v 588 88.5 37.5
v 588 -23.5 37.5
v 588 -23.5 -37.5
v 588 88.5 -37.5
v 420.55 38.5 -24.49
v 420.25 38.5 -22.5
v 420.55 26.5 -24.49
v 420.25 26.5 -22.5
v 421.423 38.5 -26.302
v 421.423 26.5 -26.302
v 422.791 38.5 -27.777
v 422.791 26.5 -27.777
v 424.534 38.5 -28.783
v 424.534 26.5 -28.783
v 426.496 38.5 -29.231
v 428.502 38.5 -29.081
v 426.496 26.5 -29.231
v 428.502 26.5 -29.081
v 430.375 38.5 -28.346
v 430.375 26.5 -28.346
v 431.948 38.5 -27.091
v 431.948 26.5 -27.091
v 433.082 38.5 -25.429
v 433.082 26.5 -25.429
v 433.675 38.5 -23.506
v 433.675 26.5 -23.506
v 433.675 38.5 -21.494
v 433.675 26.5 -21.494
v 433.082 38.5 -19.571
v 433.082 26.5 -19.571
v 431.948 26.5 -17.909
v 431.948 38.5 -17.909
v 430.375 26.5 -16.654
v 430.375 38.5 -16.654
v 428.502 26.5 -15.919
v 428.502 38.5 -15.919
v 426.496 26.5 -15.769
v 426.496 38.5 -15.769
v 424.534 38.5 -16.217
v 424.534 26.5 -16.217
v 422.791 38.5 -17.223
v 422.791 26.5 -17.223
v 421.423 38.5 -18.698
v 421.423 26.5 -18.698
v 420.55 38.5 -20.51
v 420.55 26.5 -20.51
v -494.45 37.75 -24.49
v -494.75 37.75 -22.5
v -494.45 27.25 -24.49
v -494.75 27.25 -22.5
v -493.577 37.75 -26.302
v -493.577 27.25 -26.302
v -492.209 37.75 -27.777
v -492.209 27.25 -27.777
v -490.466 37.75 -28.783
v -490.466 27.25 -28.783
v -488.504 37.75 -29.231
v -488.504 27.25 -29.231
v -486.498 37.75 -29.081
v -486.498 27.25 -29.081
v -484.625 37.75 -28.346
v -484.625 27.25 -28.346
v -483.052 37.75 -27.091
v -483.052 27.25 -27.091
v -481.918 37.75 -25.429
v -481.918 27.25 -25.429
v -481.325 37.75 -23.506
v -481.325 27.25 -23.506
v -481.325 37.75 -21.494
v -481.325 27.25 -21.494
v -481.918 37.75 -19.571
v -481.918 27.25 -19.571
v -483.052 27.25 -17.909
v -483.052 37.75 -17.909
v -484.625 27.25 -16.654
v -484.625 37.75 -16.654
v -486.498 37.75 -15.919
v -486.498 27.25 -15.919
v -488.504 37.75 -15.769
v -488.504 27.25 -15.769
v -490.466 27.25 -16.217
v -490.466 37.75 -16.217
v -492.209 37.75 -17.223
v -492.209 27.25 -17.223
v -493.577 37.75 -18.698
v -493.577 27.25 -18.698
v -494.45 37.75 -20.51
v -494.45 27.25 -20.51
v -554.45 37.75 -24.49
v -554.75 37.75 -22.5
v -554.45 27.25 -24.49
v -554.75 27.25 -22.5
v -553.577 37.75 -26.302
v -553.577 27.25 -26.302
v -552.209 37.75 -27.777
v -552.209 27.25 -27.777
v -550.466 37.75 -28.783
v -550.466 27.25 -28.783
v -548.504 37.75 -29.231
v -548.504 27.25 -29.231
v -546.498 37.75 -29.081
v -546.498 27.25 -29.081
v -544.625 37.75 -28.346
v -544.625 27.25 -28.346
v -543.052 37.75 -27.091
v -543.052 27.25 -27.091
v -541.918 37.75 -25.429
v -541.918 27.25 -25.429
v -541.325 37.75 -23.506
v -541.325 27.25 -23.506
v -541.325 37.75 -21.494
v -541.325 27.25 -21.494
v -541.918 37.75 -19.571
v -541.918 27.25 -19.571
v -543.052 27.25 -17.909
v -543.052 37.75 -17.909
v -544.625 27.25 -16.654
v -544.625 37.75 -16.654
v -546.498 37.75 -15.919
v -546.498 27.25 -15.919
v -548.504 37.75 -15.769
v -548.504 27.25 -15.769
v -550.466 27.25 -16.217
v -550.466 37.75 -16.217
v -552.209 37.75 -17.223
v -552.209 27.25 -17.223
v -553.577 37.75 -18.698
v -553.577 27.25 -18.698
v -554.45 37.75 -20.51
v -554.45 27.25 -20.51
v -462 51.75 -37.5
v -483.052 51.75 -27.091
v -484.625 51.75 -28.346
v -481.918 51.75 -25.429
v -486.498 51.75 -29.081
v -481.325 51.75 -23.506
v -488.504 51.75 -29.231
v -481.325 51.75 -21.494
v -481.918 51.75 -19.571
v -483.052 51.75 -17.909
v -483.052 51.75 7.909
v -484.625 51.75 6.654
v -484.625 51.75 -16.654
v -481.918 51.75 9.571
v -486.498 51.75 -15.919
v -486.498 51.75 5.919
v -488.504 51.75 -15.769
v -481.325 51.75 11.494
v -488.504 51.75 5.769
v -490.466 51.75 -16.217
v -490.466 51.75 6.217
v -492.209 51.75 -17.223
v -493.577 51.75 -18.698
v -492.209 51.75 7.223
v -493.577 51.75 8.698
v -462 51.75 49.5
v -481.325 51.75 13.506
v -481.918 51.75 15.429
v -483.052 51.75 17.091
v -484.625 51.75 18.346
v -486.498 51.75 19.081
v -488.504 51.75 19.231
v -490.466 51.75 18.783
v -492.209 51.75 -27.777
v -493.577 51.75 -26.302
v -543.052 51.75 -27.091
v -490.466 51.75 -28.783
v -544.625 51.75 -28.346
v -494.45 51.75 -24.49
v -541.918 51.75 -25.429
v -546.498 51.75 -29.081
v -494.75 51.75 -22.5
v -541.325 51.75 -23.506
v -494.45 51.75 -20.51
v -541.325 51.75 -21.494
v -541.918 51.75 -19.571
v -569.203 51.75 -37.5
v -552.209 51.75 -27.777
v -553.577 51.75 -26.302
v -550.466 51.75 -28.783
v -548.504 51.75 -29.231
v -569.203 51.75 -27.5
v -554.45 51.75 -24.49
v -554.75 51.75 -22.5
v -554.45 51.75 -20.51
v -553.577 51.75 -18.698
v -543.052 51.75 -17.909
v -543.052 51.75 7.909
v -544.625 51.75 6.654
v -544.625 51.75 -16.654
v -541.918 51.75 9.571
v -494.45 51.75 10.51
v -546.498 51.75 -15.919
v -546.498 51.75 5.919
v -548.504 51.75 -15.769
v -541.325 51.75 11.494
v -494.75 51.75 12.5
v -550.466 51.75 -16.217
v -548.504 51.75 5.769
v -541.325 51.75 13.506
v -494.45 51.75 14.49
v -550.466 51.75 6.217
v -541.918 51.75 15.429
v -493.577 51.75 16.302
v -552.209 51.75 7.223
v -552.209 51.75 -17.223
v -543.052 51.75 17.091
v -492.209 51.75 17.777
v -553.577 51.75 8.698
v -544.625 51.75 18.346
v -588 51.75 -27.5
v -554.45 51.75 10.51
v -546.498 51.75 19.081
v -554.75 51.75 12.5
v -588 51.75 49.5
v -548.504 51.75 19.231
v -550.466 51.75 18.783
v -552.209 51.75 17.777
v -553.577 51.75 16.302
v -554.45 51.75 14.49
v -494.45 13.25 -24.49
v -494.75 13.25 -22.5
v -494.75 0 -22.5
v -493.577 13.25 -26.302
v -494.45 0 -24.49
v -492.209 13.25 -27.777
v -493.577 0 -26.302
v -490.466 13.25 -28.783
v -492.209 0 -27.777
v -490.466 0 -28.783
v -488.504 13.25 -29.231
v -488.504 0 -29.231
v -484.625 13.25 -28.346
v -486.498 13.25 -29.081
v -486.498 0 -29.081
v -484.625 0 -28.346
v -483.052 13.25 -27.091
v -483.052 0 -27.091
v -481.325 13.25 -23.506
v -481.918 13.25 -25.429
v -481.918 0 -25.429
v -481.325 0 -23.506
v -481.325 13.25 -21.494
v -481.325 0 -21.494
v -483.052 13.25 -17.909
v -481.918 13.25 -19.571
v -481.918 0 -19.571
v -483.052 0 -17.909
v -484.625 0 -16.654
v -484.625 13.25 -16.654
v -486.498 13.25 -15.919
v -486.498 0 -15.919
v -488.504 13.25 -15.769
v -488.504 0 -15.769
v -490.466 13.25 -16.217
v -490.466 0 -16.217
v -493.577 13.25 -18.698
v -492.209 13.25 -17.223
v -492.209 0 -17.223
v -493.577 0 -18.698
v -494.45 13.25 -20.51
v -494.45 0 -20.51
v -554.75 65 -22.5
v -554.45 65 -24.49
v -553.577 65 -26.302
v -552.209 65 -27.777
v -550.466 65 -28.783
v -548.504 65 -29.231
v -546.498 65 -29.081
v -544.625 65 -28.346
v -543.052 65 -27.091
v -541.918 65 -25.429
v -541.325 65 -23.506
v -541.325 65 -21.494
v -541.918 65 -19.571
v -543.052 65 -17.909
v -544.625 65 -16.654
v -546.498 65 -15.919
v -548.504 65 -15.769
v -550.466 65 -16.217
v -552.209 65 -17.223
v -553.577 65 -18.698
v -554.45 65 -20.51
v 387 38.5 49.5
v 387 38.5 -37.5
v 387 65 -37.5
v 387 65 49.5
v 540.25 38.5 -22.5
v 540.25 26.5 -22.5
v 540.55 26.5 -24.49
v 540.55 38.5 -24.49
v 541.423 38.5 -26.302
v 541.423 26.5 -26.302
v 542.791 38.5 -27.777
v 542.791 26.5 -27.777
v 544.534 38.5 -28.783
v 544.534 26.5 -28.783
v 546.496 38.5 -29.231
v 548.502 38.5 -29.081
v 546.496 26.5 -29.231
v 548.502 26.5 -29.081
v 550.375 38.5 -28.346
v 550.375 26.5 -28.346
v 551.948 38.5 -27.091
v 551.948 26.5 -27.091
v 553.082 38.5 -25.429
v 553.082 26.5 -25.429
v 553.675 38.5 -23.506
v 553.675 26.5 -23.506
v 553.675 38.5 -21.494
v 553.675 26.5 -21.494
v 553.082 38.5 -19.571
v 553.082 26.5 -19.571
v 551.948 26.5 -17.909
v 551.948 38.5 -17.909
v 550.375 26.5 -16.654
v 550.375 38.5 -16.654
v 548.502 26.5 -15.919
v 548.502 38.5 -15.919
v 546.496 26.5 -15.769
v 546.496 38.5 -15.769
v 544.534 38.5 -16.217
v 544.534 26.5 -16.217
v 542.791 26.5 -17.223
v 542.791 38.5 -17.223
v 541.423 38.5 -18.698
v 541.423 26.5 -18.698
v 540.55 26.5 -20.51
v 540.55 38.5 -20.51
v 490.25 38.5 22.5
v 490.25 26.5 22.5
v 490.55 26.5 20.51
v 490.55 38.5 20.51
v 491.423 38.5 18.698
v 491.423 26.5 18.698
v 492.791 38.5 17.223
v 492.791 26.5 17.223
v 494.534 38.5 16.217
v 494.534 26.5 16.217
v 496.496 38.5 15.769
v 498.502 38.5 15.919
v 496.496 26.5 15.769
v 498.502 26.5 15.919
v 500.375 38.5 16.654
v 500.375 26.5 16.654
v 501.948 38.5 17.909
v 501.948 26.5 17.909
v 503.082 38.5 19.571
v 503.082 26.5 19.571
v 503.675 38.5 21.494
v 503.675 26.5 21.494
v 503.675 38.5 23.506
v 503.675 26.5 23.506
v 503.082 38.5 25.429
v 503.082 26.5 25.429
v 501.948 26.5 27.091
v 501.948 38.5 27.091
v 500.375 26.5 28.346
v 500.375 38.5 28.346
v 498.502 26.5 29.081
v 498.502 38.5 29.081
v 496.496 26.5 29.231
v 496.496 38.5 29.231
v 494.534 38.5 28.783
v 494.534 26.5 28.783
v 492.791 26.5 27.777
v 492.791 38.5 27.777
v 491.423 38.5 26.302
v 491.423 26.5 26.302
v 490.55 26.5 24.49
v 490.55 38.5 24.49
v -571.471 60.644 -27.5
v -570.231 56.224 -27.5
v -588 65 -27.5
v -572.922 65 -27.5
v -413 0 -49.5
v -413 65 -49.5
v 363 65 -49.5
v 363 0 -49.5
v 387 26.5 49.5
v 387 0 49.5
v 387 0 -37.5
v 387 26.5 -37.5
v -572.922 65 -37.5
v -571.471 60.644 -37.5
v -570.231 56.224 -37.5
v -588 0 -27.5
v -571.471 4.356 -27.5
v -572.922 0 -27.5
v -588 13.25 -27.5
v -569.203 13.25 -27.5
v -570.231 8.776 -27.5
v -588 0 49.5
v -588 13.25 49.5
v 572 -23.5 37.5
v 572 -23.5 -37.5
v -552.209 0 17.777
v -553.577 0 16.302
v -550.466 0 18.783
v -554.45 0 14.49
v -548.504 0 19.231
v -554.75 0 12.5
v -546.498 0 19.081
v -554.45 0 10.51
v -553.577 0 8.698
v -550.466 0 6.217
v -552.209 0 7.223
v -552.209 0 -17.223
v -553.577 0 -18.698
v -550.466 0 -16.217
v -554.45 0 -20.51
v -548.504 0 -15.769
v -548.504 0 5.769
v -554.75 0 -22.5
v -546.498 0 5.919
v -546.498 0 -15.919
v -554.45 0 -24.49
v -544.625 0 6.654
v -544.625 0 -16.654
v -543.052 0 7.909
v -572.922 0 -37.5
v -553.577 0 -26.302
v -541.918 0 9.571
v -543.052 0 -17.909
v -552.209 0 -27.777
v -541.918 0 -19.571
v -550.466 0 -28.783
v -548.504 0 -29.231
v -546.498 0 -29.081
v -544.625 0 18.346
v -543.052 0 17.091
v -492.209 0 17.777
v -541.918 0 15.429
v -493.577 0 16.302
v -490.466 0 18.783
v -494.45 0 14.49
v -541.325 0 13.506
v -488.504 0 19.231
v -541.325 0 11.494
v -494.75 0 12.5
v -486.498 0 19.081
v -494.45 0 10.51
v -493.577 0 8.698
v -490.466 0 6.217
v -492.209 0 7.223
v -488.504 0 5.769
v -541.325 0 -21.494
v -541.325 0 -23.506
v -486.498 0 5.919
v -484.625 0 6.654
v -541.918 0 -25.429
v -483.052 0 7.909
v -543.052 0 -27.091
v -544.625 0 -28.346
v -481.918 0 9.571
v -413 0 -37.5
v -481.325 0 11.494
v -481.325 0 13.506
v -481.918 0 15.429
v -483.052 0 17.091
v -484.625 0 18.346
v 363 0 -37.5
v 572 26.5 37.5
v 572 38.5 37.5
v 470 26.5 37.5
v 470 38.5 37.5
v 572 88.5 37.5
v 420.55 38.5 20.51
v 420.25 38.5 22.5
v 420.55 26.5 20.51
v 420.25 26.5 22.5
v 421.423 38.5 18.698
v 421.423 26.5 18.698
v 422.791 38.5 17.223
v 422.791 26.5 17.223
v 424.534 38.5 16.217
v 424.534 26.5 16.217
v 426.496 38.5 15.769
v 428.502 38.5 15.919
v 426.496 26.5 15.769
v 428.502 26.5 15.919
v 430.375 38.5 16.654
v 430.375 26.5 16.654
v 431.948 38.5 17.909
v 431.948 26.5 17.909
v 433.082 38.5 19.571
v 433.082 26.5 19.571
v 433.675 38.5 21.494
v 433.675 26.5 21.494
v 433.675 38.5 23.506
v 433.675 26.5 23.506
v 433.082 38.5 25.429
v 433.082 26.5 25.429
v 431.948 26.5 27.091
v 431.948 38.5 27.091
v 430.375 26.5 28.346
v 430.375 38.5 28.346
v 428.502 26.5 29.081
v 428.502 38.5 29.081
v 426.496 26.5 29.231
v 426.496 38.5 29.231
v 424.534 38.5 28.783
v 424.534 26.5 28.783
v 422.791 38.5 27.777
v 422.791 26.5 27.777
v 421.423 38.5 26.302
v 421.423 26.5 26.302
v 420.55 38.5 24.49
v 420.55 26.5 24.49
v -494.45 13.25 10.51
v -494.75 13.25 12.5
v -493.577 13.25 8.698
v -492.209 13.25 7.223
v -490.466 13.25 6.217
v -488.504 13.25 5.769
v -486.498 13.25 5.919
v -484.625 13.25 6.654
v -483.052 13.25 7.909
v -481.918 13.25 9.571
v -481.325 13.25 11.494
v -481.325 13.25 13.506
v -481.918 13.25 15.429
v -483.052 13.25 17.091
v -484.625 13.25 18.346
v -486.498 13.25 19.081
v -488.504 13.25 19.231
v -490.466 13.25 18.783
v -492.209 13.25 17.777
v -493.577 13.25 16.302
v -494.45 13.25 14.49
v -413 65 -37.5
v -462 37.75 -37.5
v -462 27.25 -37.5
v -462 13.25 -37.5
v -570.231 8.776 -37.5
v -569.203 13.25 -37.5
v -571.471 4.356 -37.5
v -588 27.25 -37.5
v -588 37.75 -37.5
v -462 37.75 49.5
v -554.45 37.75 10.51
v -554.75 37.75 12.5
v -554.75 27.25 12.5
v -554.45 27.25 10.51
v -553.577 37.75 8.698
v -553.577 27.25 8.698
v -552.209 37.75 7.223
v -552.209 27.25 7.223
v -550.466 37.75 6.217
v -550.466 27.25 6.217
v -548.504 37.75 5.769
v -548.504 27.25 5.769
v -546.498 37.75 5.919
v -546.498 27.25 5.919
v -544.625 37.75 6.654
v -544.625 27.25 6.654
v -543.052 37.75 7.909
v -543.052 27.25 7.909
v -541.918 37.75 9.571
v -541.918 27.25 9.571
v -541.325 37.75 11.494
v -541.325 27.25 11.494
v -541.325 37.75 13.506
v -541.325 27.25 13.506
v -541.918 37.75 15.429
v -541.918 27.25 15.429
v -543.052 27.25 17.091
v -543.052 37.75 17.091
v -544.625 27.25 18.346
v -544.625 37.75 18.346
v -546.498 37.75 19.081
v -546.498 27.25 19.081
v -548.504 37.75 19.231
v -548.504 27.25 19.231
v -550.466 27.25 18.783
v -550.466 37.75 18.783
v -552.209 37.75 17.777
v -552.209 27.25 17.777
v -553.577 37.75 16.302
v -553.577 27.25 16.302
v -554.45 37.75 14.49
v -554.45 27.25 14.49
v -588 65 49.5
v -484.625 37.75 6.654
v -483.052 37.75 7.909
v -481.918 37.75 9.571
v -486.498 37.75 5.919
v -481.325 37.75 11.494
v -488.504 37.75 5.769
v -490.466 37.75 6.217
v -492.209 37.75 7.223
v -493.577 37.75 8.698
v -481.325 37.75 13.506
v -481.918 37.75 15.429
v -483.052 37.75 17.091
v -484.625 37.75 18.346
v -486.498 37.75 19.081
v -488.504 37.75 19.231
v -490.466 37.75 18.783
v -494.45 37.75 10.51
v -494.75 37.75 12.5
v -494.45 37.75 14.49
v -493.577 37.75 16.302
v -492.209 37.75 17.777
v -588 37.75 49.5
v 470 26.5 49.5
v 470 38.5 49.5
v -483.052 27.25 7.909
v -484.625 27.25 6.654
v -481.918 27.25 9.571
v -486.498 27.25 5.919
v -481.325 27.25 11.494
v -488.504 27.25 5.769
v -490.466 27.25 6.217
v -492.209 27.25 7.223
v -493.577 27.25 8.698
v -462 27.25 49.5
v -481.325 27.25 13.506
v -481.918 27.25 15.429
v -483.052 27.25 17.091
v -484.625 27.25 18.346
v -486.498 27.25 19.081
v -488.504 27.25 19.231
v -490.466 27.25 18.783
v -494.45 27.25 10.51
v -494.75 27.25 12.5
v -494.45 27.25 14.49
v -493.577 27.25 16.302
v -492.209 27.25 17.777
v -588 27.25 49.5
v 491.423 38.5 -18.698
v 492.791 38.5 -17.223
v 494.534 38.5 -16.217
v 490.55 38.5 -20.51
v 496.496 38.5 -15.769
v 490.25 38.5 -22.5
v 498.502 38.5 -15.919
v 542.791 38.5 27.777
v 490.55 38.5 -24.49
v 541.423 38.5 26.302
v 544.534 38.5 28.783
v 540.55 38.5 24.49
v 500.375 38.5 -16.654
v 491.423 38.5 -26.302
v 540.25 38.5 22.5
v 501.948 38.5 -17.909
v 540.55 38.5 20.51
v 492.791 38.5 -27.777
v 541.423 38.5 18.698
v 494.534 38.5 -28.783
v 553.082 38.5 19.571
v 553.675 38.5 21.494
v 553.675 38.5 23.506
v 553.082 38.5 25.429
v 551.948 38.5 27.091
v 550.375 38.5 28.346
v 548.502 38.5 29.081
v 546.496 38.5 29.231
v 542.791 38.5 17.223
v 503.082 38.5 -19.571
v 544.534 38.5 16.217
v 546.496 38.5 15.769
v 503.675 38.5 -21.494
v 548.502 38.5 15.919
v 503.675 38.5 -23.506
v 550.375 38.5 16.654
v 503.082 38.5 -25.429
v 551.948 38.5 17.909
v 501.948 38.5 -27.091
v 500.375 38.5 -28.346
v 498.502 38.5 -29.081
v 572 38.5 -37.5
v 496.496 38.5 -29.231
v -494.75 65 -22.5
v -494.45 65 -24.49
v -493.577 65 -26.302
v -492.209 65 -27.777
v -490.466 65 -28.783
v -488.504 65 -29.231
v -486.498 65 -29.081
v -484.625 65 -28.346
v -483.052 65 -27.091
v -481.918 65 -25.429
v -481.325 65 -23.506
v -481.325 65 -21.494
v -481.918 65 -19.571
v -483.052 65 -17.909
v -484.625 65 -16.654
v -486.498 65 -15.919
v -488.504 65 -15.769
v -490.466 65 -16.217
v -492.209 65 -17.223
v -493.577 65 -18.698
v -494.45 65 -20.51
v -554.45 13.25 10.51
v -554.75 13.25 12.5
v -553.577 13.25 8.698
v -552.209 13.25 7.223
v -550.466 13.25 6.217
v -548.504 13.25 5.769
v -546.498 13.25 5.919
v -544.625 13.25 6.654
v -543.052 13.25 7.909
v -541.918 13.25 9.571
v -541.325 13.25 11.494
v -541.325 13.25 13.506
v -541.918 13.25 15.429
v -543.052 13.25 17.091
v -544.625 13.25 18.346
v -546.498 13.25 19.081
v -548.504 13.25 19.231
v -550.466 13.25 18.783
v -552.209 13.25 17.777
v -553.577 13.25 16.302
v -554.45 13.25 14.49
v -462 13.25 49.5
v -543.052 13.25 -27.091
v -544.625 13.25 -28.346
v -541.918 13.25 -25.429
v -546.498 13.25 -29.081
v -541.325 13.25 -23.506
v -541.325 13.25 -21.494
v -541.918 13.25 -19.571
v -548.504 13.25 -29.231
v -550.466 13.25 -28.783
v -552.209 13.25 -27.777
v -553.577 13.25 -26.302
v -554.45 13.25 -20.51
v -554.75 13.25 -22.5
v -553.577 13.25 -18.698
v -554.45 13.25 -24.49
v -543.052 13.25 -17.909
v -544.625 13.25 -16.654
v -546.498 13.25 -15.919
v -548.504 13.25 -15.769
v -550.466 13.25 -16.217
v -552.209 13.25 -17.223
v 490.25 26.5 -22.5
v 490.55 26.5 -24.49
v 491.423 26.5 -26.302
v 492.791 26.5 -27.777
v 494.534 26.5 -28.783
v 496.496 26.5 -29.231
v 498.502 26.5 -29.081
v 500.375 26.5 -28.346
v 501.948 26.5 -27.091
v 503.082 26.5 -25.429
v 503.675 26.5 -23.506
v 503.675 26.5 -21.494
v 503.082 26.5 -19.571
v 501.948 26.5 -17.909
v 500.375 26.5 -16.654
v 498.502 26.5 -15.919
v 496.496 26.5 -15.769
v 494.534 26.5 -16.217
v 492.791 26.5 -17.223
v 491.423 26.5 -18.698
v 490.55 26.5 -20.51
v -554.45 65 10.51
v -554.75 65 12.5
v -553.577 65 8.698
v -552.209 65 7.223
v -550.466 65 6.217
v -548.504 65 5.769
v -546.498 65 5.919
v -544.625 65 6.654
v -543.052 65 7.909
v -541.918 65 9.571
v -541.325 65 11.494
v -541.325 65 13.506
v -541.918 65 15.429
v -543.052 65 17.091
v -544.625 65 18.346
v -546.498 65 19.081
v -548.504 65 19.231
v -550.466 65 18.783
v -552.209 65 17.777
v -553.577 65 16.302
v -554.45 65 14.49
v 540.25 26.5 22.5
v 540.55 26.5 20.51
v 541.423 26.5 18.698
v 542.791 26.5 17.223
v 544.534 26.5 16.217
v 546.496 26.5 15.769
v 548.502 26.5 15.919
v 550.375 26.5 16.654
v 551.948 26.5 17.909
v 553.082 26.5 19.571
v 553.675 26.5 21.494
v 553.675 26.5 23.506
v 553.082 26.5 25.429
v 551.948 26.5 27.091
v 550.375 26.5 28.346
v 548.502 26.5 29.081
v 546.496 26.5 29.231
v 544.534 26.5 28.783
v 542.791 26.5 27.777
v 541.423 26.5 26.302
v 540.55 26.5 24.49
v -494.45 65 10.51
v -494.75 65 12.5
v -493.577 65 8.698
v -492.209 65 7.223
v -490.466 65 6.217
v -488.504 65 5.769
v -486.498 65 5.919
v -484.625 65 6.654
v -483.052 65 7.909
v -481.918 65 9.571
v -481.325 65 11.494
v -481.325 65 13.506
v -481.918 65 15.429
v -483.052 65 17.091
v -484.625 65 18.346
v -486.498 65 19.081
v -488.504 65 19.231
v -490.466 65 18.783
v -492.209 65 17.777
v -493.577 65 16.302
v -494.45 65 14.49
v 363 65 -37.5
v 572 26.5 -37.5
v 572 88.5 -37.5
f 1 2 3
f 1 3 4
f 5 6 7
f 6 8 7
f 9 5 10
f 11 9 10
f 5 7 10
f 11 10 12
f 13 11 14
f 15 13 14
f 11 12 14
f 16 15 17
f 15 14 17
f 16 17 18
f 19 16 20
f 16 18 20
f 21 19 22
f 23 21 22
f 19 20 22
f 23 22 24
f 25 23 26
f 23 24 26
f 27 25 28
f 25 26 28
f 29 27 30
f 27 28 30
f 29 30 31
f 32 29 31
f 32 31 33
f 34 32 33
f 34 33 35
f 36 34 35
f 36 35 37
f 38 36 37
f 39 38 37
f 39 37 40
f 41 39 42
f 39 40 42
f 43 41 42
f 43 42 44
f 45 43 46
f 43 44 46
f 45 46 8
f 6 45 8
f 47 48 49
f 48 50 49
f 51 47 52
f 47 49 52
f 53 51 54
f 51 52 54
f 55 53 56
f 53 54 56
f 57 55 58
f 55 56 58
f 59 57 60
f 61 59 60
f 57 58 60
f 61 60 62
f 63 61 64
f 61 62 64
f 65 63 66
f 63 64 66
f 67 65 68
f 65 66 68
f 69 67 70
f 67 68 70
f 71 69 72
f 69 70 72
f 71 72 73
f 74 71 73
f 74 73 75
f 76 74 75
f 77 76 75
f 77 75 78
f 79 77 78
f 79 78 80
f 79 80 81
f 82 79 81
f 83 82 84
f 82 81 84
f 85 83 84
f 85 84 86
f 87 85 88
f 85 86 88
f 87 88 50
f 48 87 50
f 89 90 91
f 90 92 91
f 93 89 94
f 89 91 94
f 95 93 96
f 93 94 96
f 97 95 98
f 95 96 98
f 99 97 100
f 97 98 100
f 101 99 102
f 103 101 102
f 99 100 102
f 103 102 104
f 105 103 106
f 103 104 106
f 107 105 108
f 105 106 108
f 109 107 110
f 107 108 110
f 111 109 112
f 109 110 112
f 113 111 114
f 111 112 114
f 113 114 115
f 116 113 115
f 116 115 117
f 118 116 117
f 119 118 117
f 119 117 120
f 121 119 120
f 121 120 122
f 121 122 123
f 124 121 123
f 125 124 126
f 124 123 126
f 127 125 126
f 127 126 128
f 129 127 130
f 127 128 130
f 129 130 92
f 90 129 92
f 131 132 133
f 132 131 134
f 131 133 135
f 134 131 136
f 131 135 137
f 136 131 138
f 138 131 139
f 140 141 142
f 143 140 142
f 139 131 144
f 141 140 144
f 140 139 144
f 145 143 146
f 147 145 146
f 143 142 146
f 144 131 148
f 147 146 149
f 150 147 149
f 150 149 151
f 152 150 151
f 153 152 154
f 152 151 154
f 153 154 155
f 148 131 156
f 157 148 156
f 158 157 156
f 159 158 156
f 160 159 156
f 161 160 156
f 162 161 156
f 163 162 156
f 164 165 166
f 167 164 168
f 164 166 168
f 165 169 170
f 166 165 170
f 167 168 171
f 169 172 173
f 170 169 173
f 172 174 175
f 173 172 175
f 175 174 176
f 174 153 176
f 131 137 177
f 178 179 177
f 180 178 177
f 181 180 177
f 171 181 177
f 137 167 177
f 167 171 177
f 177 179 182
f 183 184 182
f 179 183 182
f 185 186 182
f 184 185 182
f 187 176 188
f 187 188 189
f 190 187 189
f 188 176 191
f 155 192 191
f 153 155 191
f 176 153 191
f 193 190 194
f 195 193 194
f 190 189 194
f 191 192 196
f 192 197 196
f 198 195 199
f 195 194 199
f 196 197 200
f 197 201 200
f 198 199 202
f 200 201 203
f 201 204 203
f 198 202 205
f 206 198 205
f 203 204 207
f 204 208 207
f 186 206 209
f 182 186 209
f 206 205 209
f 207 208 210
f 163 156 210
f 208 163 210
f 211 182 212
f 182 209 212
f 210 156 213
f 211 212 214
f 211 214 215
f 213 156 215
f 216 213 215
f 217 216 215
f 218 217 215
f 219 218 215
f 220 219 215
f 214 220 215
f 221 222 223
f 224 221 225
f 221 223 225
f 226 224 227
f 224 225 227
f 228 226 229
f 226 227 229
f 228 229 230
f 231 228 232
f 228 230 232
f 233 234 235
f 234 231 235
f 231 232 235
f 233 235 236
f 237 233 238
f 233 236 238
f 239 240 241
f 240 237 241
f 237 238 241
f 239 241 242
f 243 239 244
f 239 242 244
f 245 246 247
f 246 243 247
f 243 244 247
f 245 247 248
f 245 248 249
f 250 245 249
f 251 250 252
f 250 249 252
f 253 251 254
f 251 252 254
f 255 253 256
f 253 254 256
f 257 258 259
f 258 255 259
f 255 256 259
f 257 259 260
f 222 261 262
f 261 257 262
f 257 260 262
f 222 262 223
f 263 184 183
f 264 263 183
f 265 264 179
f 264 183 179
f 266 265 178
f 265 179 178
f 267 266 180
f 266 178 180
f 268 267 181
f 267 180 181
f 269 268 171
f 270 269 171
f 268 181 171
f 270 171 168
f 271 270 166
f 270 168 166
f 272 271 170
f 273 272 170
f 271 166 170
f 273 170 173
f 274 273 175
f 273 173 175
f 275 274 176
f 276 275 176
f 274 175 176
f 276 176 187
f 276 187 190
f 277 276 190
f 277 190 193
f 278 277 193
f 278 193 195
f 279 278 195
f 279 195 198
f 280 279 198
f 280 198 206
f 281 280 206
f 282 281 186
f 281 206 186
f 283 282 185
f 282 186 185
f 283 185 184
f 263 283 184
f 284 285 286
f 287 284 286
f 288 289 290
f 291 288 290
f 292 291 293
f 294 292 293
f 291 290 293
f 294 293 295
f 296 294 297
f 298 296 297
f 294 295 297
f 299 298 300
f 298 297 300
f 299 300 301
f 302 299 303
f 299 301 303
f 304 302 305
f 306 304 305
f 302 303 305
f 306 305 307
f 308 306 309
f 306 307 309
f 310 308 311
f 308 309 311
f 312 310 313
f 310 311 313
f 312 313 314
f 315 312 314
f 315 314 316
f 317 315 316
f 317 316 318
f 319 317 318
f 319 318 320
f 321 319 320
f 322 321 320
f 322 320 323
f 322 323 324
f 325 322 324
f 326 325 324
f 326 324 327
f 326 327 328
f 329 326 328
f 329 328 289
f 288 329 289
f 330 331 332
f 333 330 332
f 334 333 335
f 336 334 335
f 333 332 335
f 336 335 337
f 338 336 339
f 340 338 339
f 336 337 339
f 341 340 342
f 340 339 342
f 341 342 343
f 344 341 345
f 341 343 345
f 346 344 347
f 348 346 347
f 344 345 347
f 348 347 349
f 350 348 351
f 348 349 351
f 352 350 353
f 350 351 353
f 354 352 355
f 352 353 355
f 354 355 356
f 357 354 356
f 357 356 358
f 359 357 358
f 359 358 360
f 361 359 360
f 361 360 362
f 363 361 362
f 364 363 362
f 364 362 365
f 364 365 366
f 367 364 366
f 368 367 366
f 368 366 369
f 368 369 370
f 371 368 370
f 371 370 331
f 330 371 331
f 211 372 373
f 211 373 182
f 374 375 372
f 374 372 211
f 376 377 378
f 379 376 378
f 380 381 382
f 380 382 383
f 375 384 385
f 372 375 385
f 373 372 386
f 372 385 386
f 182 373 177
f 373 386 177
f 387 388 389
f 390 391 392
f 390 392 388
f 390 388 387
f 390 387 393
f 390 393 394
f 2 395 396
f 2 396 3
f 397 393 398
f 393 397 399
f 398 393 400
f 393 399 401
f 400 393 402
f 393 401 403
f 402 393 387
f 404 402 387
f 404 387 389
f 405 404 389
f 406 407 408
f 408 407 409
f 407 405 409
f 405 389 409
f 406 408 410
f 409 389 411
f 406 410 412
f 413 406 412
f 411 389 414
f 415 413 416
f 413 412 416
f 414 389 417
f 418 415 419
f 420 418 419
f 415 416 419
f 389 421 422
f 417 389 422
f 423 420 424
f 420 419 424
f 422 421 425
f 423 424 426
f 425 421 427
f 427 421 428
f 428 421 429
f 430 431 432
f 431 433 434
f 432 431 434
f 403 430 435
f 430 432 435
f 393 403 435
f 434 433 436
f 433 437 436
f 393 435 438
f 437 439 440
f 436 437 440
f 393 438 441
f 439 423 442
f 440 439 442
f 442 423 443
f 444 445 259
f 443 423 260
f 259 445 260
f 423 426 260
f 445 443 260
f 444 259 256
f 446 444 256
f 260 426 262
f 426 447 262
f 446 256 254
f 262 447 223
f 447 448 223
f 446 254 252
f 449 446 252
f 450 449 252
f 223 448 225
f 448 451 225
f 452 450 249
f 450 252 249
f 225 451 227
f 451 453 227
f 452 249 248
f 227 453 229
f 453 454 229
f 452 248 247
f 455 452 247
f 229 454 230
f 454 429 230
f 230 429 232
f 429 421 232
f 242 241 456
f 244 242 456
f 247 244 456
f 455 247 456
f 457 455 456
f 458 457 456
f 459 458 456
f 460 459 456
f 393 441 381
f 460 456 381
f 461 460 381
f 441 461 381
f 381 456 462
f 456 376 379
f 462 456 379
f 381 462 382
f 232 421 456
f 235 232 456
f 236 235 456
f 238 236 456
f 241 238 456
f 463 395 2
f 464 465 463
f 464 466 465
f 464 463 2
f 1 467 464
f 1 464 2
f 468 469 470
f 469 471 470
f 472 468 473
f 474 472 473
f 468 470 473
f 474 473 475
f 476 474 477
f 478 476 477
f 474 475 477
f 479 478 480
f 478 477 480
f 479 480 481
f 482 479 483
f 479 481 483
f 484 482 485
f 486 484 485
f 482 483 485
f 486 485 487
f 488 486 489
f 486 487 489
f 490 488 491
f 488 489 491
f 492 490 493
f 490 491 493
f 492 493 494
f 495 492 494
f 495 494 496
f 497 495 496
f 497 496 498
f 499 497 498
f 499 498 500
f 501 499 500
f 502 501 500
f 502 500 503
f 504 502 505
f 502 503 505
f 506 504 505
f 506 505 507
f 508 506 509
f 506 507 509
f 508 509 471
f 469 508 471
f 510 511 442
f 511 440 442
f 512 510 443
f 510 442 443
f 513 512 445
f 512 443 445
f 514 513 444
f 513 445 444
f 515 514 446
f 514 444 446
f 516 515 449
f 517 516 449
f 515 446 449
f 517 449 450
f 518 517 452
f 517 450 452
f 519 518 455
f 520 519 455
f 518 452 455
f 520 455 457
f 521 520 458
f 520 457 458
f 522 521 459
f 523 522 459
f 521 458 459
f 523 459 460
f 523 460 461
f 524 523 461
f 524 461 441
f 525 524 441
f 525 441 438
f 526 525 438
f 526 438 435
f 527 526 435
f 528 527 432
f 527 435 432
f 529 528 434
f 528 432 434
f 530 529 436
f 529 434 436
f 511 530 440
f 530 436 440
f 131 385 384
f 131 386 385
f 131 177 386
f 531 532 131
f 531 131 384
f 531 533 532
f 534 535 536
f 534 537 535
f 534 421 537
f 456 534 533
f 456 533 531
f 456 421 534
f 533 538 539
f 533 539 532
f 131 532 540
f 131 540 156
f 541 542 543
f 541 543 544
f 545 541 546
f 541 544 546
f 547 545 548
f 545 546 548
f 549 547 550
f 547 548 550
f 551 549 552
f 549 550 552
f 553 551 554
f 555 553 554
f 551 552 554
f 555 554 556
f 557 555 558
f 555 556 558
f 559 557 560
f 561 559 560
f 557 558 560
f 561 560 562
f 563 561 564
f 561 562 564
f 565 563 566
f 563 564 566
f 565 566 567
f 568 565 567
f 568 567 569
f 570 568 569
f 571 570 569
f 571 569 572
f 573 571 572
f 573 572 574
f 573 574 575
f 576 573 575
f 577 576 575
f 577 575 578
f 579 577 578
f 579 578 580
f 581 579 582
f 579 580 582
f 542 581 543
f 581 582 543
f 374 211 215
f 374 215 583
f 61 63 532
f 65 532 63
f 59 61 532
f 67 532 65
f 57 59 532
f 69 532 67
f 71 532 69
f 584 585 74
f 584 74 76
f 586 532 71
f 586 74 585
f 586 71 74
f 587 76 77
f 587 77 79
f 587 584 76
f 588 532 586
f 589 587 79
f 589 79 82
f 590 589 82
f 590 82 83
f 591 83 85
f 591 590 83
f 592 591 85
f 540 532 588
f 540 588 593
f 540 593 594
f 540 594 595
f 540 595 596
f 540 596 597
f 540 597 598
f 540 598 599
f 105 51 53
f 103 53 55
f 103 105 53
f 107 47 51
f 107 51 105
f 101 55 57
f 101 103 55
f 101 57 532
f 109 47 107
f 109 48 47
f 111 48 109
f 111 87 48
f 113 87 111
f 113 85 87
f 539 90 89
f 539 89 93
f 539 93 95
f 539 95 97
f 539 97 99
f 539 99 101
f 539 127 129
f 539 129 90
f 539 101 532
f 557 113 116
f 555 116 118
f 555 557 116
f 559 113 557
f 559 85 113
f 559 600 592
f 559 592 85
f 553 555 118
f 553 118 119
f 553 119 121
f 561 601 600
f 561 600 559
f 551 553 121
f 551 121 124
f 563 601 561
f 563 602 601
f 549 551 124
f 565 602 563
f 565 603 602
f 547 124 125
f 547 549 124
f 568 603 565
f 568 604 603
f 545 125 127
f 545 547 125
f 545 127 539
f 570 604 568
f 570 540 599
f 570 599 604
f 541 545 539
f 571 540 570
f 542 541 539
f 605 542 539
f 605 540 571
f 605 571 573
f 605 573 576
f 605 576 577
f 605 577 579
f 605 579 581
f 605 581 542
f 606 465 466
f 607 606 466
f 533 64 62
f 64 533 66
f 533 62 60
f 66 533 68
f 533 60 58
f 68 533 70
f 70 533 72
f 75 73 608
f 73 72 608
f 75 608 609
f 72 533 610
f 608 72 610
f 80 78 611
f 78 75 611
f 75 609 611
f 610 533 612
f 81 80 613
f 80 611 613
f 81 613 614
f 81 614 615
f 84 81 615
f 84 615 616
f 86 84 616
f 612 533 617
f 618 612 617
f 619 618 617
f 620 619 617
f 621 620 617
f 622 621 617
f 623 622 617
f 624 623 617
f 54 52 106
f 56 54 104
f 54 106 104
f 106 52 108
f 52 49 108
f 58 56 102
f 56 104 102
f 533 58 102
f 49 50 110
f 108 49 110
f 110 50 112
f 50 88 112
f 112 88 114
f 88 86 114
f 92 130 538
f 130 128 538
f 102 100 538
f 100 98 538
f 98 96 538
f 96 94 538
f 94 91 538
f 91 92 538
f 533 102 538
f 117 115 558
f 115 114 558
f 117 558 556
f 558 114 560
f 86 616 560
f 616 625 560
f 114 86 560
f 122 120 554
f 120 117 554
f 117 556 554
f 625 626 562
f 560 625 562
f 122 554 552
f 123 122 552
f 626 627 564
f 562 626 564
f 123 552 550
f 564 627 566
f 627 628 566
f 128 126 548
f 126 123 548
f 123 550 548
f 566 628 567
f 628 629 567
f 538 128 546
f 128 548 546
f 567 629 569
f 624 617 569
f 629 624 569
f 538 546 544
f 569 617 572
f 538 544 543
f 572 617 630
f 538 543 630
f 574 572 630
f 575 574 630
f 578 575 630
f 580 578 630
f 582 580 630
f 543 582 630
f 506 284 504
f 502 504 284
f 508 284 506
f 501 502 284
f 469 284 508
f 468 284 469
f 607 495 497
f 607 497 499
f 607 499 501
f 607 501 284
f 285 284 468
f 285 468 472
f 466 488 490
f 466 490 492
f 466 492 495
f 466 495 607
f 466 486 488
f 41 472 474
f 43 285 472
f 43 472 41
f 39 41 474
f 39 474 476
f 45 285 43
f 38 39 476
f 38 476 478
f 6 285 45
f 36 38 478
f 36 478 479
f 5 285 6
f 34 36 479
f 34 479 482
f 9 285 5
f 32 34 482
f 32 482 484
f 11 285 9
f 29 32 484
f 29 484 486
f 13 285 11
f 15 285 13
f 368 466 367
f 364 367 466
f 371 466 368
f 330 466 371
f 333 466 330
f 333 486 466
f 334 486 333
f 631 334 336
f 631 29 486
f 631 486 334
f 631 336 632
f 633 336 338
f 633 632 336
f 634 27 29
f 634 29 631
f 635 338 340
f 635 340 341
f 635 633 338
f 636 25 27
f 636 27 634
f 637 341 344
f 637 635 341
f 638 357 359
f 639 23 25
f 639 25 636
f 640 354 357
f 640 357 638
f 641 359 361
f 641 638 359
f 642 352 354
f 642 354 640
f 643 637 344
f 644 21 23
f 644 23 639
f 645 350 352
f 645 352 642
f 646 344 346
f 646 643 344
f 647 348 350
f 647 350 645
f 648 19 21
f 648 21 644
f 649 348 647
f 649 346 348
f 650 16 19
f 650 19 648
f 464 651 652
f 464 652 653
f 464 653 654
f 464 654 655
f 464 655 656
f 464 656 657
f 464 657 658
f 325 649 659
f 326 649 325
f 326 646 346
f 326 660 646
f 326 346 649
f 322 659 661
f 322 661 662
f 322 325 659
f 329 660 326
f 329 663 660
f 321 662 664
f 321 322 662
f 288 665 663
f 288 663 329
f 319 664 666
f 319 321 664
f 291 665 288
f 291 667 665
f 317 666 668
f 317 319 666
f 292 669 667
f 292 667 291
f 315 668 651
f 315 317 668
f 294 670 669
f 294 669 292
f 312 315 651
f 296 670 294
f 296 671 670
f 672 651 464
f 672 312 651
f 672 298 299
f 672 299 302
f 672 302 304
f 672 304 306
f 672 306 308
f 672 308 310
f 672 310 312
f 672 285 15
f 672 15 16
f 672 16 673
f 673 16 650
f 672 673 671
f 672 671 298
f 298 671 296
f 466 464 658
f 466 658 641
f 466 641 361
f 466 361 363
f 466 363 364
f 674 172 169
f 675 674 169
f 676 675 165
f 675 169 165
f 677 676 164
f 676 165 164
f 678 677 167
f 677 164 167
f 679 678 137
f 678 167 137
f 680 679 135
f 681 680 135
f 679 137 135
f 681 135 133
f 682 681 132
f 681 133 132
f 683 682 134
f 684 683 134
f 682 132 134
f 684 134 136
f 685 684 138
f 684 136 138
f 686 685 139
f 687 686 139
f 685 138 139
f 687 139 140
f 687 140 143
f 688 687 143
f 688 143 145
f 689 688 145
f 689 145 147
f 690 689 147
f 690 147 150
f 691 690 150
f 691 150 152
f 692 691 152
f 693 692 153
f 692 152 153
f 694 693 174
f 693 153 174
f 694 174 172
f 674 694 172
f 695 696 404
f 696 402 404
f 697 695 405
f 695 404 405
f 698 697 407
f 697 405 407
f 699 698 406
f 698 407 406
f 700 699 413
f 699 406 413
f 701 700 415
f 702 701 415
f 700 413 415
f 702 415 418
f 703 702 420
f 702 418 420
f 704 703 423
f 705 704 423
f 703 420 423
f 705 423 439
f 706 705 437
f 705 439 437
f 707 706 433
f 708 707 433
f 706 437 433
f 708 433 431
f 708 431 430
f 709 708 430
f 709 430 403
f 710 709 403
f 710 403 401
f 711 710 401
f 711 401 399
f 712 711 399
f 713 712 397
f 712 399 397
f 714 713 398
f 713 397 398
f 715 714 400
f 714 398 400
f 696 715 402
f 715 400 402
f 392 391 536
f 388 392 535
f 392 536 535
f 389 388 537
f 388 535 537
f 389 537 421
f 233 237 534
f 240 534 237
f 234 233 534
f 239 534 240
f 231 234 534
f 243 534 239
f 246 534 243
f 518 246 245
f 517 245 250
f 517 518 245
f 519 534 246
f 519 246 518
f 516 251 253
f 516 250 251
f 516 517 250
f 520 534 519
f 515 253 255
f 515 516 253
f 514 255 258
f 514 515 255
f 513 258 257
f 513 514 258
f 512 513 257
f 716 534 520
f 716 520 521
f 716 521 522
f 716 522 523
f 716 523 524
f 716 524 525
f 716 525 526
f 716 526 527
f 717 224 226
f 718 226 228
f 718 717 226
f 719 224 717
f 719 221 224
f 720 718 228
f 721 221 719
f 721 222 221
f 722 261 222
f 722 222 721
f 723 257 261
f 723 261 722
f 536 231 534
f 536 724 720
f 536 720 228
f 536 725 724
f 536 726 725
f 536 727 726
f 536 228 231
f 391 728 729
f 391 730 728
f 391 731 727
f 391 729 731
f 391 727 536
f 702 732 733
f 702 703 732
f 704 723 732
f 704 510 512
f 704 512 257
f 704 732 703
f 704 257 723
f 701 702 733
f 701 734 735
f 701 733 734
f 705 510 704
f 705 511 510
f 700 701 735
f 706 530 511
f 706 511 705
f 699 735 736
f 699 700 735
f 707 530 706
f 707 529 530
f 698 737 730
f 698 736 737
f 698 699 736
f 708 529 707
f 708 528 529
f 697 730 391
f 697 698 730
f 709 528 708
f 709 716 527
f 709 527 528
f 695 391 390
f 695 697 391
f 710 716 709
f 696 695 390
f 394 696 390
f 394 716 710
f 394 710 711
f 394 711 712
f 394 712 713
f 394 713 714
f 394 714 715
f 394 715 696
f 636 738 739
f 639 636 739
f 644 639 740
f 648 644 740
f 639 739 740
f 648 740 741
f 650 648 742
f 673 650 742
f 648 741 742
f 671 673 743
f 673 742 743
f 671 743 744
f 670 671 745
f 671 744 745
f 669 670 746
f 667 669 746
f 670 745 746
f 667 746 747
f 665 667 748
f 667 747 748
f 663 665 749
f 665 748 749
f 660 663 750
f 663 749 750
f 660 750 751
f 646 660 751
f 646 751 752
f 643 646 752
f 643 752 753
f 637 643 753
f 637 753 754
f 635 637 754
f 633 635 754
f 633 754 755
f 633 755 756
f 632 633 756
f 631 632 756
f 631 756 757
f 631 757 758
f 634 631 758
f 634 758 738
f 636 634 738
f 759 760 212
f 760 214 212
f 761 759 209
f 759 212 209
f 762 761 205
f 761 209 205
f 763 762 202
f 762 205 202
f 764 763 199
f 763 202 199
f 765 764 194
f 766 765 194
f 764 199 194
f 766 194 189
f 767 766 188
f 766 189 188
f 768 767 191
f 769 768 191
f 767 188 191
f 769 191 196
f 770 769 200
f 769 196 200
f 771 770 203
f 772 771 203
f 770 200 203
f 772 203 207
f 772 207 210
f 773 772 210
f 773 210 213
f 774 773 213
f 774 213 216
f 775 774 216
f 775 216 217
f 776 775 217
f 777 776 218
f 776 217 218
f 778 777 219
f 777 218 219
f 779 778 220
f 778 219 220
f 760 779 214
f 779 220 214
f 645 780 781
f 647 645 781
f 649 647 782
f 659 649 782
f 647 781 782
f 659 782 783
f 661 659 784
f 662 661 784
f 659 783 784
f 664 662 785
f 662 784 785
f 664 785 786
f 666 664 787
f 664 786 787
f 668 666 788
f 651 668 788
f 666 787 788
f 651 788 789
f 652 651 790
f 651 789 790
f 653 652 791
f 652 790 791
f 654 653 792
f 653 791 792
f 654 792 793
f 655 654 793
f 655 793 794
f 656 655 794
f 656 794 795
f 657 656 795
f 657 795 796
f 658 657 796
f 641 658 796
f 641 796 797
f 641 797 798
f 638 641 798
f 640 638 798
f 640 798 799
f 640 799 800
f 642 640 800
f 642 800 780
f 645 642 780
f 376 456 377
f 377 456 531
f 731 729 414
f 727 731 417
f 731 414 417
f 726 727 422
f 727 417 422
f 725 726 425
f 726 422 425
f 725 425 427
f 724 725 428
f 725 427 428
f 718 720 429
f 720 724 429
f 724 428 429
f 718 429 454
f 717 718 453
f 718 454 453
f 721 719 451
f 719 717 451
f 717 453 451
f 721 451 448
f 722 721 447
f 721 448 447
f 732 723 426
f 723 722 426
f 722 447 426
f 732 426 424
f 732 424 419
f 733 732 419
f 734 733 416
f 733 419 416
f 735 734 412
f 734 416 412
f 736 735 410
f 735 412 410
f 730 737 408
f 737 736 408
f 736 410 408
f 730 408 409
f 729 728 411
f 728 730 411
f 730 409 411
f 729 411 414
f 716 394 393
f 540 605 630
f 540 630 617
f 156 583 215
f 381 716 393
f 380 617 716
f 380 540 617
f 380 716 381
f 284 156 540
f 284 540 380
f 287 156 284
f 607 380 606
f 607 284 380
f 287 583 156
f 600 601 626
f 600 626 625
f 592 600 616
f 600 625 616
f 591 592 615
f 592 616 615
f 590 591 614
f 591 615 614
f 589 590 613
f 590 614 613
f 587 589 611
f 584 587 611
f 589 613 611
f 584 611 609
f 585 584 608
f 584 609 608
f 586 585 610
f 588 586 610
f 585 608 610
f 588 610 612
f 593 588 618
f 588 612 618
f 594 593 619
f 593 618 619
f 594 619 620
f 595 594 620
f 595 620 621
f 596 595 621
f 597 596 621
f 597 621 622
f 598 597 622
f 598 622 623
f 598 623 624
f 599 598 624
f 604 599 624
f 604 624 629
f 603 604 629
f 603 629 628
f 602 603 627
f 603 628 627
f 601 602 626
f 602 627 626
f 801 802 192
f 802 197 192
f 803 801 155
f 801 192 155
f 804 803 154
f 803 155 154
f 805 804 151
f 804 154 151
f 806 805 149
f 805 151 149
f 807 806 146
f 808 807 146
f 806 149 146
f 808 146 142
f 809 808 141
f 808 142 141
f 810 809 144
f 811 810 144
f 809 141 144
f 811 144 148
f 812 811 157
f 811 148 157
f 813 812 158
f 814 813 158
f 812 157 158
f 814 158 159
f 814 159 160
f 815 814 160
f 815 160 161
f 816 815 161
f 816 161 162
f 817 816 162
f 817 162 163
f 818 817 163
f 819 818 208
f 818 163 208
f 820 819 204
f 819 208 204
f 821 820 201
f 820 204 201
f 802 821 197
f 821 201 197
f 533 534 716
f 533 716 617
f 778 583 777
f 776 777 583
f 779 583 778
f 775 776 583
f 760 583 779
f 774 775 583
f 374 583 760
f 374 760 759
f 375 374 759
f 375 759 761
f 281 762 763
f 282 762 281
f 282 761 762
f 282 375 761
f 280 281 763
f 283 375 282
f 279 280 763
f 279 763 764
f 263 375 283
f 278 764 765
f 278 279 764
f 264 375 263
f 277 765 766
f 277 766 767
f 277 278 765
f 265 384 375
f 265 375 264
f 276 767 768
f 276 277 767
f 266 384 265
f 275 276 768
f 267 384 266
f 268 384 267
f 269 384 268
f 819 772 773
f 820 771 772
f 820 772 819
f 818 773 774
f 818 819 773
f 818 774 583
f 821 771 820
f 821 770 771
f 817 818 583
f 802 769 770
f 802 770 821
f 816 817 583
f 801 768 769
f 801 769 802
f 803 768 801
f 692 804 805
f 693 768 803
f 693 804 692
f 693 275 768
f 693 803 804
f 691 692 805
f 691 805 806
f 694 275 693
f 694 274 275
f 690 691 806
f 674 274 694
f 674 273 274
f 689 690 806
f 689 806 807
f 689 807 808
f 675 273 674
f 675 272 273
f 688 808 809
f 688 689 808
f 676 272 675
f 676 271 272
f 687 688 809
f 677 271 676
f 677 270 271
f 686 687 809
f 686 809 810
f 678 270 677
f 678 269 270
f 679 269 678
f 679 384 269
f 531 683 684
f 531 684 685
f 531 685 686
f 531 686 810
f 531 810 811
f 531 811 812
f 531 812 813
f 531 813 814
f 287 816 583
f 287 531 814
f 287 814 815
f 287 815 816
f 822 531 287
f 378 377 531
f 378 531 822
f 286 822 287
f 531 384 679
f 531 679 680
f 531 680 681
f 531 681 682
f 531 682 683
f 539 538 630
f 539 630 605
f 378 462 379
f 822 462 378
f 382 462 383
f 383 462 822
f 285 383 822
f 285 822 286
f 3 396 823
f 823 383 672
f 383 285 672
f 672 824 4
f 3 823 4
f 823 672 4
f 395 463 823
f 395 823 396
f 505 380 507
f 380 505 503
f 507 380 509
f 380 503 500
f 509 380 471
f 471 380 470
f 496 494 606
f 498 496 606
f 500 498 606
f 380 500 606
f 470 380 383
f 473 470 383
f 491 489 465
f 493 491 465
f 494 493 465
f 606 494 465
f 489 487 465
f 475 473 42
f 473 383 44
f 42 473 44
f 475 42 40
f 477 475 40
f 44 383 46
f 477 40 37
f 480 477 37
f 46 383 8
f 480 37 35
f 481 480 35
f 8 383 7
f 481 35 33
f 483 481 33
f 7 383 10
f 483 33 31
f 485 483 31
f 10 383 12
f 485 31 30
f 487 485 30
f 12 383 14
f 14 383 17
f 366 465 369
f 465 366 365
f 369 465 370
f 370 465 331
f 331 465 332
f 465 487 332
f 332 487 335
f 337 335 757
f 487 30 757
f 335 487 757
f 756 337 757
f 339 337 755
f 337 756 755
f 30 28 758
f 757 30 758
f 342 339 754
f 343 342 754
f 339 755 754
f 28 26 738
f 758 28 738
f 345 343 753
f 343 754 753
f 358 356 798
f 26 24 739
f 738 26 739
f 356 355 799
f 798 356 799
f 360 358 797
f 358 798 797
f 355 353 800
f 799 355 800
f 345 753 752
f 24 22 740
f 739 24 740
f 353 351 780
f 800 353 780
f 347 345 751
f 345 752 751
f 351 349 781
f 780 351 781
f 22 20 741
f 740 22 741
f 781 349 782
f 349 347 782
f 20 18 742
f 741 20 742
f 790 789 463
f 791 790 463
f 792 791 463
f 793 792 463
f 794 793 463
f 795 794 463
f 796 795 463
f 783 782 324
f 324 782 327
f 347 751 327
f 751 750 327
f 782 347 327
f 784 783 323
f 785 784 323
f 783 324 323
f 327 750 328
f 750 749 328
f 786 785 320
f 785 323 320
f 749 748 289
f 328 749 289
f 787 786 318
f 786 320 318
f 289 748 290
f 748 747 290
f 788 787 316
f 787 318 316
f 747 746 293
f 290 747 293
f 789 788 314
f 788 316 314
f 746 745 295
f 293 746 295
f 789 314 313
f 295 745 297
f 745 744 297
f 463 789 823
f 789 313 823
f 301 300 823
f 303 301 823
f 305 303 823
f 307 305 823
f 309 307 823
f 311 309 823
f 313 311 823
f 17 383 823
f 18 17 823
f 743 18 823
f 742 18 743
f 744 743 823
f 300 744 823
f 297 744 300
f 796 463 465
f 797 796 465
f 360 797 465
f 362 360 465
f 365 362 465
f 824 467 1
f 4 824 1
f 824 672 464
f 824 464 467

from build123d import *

# Parameters (mm, degrees)
SKETCH1_W                  = 1176
SKETCH1_H                  = 75
BOSS_EXTRUDE1_DEPTH        = 65
SKETCH2_W                  = 776
SKETCH2_H                  = 65
BOSS_EXTRUDE2_DEPTH        = 12
SKETCH3_W                  = 1058
SKETCH3_H                  = 65
BOSS_EXTRUDE3_DEPTH        = 12
SKETCH4_W                  = 16
SKETCH4_H                  = 23.5
SKETCH4_H_2                = 65
BOSS_EXTRUDE4_DEPTH        = 75
CUT_EXTRUDE1_DEPTH         = 601.953617179
CUT_EXTRUDE1_DEPTH_BACK    = 601.953617179
SKETCH5_W                  = 102
SKETCH5_H                  = 50
F_12_0MM_DOWEL_HOLE1_D     = 13.5
F_12_0MM_DOWEL_HOLE1_DEPTH = 65
CUT_EXTRUDE2_DEPTH         = 10
CUT_EXTRUDE3_DEPTH         = 601.953617179
CUT_EXTRUDE3_DEPTH_BACK    = 601.953617179
SKETCH11_W                 = 127.490852802
SKETCH11_H                 = 14
CUT_EXTRUDE4_DEPTH         = 601.953617179
CUT_EXTRUDE4_DEPTH_BACK    = 601.953617179
SKETCH12_W                 = 83
SKETCH12_H                 = 26.5


with BuildPart() as part:
    # Sketch1 → Boss-Extrude1 (new body)
    with BuildSketch(Plane(origin=(0, 0, 0), x_dir=(1, 0, 0), z_dir=(0, 1, 0))):
        Rectangle(SKETCH1_W, SKETCH1_H)
    extrude(amount=BOSS_EXTRUDE1_DEPTH)

    # Sketch2 → Boss-Extrude2 (add)
    with BuildSketch(Plane.XY.offset(-37.5)):
        with Locations((-25, 32.5)):
            Rectangle(SKETCH2_W, SKETCH2_H)
    extrude(amount=-BOSS_EXTRUDE2_DEPTH)

    # Sketch3 → Boss-Extrude3 (add)
    with BuildSketch(Plane.XY.offset(37.5)):
        with Locations((-59, 32.5)):
            Rectangle(SKETCH3_W, SKETCH3_H)
    extrude(amount=BOSS_EXTRUDE3_DEPTH)

    # Sketch4 → Boss-Extrude4 (add)
    with BuildSketch(Plane.XY.offset(37.5)):
        with Locations((580, -11.75)):
            Rectangle(SKETCH4_W, SKETCH4_H)
        with Locations((580, 32.5)):
            Rectangle(SKETCH4_W, SKETCH4_H_2)
        with Locations((580, 76.75)):
            Rectangle(SKETCH4_W, SKETCH4_H)
    extrude(amount=-BOSS_EXTRUDE4_DEPTH)

    # Sketch5 → Cut-Extrude1 (cut, two sides: drawn at the far end of the back side and taken through both)
    with BuildSketch(Plane.XY.offset(37.5).offset(-CUT_EXTRUDE1_DEPTH_BACK)):
        with Locations((521, 1.5)):
            Rectangle(SKETCH5_W, SKETCH5_H)
        with Locations((521, 63.5)):
            Rectangle(SKETCH5_W, SKETCH5_H)
    extrude(amount=CUT_EXTRUDE1_DEPTH + CUT_EXTRUDE1_DEPTH_BACK, mode=Mode.SUBTRACT)

    # Ø12.0mm Dowel Hole1
    with Locations(Plane(origin=(0, 65, 0), x_dir=(1, 0, 0), z_dir=(0, 1, 0))):
        with Locations((-548, -12.5), (-488, -12.5), (-488, 22.5), (-548, 22.5), (427, 22.5), (497, 22.5), (547, 22.5), (547, -22.5), (497, -22.5), (427, -22.5)):
            Hole(F_12_0MM_DOWEL_HOLE1_D / 2, depth=F_12_0MM_DOWEL_HOLE1_DEPTH)

    # Sketch9 → Cut-Extrude2 (cut)
    with BuildSketch(Plane(origin=(0, 0, -37.5), x_dir=(-1, 0, 0), z_dir=(0, 0, -1))):
        with BuildLine():
            Line((462, 51.75), (462, 37.75))
            Line((462, 37.75), (600.472295571, 37.75))
            ThreePointArc((600.472295571, 37.75), (600.253164472, 32.5), (600.472295571, 27.25))
            Line((600.472295571, 27.25), (462, 27.25))
            Line((462, 27.25), (462, 13.25))
            Line((462, 13.25), (569.202978401, 13.25))
            ThreePointArc((569.202978401, 13.25), (759.253164472, 32.5), (569.202978401, 51.75))
            Line((569.202978401, 51.75), (462, 51.75))
        make_face()
    extrude(amount=-CUT_EXTRUDE2_DEPTH, mode=Mode.SUBTRACT)

    # Sketch11 → Cut-Extrude3 (cut, two sides: drawn at the far end of the back side and taken through both)
    with BuildSketch(Plane(origin=(0, 0, -37.5), x_dir=(-1, 0, 0), z_dir=(0, 0, -1)).offset(-CUT_EXTRUDE3_DEPTH_BACK)):
        with Locations((525.745426401, 44.75)):
            Rectangle(SKETCH11_W, SKETCH11_H)
        with Locations((525.745426401, 20.25)):
            Rectangle(SKETCH11_W, SKETCH11_H)
    extrude(amount=CUT_EXTRUDE3_DEPTH + CUT_EXTRUDE3_DEPTH_BACK, mode=Mode.SUBTRACT)

    # Sketch12 → Cut-Extrude4 (cut, two sides: drawn at the far end of the back side and taken through both)
    with BuildSketch(Plane(origin=(0, 0, -37.5), x_dir=(-1, 0, 0), z_dir=(0, 0, -1)).offset(-CUT_EXTRUDE4_DEPTH_BACK)):
        with Locations((-428.5, 13.25)):
            Rectangle(SKETCH12_W, SKETCH12_H)
        with Locations((-428.5, 51.75)):
            Rectangle(SKETCH12_W, SKETCH12_H)
    extrude(amount=CUT_EXTRUDE4_DEPTH + CUT_EXTRUDE4_DEPTH_BACK, mode=Mode.SUBTRACT)


solid = part.part
